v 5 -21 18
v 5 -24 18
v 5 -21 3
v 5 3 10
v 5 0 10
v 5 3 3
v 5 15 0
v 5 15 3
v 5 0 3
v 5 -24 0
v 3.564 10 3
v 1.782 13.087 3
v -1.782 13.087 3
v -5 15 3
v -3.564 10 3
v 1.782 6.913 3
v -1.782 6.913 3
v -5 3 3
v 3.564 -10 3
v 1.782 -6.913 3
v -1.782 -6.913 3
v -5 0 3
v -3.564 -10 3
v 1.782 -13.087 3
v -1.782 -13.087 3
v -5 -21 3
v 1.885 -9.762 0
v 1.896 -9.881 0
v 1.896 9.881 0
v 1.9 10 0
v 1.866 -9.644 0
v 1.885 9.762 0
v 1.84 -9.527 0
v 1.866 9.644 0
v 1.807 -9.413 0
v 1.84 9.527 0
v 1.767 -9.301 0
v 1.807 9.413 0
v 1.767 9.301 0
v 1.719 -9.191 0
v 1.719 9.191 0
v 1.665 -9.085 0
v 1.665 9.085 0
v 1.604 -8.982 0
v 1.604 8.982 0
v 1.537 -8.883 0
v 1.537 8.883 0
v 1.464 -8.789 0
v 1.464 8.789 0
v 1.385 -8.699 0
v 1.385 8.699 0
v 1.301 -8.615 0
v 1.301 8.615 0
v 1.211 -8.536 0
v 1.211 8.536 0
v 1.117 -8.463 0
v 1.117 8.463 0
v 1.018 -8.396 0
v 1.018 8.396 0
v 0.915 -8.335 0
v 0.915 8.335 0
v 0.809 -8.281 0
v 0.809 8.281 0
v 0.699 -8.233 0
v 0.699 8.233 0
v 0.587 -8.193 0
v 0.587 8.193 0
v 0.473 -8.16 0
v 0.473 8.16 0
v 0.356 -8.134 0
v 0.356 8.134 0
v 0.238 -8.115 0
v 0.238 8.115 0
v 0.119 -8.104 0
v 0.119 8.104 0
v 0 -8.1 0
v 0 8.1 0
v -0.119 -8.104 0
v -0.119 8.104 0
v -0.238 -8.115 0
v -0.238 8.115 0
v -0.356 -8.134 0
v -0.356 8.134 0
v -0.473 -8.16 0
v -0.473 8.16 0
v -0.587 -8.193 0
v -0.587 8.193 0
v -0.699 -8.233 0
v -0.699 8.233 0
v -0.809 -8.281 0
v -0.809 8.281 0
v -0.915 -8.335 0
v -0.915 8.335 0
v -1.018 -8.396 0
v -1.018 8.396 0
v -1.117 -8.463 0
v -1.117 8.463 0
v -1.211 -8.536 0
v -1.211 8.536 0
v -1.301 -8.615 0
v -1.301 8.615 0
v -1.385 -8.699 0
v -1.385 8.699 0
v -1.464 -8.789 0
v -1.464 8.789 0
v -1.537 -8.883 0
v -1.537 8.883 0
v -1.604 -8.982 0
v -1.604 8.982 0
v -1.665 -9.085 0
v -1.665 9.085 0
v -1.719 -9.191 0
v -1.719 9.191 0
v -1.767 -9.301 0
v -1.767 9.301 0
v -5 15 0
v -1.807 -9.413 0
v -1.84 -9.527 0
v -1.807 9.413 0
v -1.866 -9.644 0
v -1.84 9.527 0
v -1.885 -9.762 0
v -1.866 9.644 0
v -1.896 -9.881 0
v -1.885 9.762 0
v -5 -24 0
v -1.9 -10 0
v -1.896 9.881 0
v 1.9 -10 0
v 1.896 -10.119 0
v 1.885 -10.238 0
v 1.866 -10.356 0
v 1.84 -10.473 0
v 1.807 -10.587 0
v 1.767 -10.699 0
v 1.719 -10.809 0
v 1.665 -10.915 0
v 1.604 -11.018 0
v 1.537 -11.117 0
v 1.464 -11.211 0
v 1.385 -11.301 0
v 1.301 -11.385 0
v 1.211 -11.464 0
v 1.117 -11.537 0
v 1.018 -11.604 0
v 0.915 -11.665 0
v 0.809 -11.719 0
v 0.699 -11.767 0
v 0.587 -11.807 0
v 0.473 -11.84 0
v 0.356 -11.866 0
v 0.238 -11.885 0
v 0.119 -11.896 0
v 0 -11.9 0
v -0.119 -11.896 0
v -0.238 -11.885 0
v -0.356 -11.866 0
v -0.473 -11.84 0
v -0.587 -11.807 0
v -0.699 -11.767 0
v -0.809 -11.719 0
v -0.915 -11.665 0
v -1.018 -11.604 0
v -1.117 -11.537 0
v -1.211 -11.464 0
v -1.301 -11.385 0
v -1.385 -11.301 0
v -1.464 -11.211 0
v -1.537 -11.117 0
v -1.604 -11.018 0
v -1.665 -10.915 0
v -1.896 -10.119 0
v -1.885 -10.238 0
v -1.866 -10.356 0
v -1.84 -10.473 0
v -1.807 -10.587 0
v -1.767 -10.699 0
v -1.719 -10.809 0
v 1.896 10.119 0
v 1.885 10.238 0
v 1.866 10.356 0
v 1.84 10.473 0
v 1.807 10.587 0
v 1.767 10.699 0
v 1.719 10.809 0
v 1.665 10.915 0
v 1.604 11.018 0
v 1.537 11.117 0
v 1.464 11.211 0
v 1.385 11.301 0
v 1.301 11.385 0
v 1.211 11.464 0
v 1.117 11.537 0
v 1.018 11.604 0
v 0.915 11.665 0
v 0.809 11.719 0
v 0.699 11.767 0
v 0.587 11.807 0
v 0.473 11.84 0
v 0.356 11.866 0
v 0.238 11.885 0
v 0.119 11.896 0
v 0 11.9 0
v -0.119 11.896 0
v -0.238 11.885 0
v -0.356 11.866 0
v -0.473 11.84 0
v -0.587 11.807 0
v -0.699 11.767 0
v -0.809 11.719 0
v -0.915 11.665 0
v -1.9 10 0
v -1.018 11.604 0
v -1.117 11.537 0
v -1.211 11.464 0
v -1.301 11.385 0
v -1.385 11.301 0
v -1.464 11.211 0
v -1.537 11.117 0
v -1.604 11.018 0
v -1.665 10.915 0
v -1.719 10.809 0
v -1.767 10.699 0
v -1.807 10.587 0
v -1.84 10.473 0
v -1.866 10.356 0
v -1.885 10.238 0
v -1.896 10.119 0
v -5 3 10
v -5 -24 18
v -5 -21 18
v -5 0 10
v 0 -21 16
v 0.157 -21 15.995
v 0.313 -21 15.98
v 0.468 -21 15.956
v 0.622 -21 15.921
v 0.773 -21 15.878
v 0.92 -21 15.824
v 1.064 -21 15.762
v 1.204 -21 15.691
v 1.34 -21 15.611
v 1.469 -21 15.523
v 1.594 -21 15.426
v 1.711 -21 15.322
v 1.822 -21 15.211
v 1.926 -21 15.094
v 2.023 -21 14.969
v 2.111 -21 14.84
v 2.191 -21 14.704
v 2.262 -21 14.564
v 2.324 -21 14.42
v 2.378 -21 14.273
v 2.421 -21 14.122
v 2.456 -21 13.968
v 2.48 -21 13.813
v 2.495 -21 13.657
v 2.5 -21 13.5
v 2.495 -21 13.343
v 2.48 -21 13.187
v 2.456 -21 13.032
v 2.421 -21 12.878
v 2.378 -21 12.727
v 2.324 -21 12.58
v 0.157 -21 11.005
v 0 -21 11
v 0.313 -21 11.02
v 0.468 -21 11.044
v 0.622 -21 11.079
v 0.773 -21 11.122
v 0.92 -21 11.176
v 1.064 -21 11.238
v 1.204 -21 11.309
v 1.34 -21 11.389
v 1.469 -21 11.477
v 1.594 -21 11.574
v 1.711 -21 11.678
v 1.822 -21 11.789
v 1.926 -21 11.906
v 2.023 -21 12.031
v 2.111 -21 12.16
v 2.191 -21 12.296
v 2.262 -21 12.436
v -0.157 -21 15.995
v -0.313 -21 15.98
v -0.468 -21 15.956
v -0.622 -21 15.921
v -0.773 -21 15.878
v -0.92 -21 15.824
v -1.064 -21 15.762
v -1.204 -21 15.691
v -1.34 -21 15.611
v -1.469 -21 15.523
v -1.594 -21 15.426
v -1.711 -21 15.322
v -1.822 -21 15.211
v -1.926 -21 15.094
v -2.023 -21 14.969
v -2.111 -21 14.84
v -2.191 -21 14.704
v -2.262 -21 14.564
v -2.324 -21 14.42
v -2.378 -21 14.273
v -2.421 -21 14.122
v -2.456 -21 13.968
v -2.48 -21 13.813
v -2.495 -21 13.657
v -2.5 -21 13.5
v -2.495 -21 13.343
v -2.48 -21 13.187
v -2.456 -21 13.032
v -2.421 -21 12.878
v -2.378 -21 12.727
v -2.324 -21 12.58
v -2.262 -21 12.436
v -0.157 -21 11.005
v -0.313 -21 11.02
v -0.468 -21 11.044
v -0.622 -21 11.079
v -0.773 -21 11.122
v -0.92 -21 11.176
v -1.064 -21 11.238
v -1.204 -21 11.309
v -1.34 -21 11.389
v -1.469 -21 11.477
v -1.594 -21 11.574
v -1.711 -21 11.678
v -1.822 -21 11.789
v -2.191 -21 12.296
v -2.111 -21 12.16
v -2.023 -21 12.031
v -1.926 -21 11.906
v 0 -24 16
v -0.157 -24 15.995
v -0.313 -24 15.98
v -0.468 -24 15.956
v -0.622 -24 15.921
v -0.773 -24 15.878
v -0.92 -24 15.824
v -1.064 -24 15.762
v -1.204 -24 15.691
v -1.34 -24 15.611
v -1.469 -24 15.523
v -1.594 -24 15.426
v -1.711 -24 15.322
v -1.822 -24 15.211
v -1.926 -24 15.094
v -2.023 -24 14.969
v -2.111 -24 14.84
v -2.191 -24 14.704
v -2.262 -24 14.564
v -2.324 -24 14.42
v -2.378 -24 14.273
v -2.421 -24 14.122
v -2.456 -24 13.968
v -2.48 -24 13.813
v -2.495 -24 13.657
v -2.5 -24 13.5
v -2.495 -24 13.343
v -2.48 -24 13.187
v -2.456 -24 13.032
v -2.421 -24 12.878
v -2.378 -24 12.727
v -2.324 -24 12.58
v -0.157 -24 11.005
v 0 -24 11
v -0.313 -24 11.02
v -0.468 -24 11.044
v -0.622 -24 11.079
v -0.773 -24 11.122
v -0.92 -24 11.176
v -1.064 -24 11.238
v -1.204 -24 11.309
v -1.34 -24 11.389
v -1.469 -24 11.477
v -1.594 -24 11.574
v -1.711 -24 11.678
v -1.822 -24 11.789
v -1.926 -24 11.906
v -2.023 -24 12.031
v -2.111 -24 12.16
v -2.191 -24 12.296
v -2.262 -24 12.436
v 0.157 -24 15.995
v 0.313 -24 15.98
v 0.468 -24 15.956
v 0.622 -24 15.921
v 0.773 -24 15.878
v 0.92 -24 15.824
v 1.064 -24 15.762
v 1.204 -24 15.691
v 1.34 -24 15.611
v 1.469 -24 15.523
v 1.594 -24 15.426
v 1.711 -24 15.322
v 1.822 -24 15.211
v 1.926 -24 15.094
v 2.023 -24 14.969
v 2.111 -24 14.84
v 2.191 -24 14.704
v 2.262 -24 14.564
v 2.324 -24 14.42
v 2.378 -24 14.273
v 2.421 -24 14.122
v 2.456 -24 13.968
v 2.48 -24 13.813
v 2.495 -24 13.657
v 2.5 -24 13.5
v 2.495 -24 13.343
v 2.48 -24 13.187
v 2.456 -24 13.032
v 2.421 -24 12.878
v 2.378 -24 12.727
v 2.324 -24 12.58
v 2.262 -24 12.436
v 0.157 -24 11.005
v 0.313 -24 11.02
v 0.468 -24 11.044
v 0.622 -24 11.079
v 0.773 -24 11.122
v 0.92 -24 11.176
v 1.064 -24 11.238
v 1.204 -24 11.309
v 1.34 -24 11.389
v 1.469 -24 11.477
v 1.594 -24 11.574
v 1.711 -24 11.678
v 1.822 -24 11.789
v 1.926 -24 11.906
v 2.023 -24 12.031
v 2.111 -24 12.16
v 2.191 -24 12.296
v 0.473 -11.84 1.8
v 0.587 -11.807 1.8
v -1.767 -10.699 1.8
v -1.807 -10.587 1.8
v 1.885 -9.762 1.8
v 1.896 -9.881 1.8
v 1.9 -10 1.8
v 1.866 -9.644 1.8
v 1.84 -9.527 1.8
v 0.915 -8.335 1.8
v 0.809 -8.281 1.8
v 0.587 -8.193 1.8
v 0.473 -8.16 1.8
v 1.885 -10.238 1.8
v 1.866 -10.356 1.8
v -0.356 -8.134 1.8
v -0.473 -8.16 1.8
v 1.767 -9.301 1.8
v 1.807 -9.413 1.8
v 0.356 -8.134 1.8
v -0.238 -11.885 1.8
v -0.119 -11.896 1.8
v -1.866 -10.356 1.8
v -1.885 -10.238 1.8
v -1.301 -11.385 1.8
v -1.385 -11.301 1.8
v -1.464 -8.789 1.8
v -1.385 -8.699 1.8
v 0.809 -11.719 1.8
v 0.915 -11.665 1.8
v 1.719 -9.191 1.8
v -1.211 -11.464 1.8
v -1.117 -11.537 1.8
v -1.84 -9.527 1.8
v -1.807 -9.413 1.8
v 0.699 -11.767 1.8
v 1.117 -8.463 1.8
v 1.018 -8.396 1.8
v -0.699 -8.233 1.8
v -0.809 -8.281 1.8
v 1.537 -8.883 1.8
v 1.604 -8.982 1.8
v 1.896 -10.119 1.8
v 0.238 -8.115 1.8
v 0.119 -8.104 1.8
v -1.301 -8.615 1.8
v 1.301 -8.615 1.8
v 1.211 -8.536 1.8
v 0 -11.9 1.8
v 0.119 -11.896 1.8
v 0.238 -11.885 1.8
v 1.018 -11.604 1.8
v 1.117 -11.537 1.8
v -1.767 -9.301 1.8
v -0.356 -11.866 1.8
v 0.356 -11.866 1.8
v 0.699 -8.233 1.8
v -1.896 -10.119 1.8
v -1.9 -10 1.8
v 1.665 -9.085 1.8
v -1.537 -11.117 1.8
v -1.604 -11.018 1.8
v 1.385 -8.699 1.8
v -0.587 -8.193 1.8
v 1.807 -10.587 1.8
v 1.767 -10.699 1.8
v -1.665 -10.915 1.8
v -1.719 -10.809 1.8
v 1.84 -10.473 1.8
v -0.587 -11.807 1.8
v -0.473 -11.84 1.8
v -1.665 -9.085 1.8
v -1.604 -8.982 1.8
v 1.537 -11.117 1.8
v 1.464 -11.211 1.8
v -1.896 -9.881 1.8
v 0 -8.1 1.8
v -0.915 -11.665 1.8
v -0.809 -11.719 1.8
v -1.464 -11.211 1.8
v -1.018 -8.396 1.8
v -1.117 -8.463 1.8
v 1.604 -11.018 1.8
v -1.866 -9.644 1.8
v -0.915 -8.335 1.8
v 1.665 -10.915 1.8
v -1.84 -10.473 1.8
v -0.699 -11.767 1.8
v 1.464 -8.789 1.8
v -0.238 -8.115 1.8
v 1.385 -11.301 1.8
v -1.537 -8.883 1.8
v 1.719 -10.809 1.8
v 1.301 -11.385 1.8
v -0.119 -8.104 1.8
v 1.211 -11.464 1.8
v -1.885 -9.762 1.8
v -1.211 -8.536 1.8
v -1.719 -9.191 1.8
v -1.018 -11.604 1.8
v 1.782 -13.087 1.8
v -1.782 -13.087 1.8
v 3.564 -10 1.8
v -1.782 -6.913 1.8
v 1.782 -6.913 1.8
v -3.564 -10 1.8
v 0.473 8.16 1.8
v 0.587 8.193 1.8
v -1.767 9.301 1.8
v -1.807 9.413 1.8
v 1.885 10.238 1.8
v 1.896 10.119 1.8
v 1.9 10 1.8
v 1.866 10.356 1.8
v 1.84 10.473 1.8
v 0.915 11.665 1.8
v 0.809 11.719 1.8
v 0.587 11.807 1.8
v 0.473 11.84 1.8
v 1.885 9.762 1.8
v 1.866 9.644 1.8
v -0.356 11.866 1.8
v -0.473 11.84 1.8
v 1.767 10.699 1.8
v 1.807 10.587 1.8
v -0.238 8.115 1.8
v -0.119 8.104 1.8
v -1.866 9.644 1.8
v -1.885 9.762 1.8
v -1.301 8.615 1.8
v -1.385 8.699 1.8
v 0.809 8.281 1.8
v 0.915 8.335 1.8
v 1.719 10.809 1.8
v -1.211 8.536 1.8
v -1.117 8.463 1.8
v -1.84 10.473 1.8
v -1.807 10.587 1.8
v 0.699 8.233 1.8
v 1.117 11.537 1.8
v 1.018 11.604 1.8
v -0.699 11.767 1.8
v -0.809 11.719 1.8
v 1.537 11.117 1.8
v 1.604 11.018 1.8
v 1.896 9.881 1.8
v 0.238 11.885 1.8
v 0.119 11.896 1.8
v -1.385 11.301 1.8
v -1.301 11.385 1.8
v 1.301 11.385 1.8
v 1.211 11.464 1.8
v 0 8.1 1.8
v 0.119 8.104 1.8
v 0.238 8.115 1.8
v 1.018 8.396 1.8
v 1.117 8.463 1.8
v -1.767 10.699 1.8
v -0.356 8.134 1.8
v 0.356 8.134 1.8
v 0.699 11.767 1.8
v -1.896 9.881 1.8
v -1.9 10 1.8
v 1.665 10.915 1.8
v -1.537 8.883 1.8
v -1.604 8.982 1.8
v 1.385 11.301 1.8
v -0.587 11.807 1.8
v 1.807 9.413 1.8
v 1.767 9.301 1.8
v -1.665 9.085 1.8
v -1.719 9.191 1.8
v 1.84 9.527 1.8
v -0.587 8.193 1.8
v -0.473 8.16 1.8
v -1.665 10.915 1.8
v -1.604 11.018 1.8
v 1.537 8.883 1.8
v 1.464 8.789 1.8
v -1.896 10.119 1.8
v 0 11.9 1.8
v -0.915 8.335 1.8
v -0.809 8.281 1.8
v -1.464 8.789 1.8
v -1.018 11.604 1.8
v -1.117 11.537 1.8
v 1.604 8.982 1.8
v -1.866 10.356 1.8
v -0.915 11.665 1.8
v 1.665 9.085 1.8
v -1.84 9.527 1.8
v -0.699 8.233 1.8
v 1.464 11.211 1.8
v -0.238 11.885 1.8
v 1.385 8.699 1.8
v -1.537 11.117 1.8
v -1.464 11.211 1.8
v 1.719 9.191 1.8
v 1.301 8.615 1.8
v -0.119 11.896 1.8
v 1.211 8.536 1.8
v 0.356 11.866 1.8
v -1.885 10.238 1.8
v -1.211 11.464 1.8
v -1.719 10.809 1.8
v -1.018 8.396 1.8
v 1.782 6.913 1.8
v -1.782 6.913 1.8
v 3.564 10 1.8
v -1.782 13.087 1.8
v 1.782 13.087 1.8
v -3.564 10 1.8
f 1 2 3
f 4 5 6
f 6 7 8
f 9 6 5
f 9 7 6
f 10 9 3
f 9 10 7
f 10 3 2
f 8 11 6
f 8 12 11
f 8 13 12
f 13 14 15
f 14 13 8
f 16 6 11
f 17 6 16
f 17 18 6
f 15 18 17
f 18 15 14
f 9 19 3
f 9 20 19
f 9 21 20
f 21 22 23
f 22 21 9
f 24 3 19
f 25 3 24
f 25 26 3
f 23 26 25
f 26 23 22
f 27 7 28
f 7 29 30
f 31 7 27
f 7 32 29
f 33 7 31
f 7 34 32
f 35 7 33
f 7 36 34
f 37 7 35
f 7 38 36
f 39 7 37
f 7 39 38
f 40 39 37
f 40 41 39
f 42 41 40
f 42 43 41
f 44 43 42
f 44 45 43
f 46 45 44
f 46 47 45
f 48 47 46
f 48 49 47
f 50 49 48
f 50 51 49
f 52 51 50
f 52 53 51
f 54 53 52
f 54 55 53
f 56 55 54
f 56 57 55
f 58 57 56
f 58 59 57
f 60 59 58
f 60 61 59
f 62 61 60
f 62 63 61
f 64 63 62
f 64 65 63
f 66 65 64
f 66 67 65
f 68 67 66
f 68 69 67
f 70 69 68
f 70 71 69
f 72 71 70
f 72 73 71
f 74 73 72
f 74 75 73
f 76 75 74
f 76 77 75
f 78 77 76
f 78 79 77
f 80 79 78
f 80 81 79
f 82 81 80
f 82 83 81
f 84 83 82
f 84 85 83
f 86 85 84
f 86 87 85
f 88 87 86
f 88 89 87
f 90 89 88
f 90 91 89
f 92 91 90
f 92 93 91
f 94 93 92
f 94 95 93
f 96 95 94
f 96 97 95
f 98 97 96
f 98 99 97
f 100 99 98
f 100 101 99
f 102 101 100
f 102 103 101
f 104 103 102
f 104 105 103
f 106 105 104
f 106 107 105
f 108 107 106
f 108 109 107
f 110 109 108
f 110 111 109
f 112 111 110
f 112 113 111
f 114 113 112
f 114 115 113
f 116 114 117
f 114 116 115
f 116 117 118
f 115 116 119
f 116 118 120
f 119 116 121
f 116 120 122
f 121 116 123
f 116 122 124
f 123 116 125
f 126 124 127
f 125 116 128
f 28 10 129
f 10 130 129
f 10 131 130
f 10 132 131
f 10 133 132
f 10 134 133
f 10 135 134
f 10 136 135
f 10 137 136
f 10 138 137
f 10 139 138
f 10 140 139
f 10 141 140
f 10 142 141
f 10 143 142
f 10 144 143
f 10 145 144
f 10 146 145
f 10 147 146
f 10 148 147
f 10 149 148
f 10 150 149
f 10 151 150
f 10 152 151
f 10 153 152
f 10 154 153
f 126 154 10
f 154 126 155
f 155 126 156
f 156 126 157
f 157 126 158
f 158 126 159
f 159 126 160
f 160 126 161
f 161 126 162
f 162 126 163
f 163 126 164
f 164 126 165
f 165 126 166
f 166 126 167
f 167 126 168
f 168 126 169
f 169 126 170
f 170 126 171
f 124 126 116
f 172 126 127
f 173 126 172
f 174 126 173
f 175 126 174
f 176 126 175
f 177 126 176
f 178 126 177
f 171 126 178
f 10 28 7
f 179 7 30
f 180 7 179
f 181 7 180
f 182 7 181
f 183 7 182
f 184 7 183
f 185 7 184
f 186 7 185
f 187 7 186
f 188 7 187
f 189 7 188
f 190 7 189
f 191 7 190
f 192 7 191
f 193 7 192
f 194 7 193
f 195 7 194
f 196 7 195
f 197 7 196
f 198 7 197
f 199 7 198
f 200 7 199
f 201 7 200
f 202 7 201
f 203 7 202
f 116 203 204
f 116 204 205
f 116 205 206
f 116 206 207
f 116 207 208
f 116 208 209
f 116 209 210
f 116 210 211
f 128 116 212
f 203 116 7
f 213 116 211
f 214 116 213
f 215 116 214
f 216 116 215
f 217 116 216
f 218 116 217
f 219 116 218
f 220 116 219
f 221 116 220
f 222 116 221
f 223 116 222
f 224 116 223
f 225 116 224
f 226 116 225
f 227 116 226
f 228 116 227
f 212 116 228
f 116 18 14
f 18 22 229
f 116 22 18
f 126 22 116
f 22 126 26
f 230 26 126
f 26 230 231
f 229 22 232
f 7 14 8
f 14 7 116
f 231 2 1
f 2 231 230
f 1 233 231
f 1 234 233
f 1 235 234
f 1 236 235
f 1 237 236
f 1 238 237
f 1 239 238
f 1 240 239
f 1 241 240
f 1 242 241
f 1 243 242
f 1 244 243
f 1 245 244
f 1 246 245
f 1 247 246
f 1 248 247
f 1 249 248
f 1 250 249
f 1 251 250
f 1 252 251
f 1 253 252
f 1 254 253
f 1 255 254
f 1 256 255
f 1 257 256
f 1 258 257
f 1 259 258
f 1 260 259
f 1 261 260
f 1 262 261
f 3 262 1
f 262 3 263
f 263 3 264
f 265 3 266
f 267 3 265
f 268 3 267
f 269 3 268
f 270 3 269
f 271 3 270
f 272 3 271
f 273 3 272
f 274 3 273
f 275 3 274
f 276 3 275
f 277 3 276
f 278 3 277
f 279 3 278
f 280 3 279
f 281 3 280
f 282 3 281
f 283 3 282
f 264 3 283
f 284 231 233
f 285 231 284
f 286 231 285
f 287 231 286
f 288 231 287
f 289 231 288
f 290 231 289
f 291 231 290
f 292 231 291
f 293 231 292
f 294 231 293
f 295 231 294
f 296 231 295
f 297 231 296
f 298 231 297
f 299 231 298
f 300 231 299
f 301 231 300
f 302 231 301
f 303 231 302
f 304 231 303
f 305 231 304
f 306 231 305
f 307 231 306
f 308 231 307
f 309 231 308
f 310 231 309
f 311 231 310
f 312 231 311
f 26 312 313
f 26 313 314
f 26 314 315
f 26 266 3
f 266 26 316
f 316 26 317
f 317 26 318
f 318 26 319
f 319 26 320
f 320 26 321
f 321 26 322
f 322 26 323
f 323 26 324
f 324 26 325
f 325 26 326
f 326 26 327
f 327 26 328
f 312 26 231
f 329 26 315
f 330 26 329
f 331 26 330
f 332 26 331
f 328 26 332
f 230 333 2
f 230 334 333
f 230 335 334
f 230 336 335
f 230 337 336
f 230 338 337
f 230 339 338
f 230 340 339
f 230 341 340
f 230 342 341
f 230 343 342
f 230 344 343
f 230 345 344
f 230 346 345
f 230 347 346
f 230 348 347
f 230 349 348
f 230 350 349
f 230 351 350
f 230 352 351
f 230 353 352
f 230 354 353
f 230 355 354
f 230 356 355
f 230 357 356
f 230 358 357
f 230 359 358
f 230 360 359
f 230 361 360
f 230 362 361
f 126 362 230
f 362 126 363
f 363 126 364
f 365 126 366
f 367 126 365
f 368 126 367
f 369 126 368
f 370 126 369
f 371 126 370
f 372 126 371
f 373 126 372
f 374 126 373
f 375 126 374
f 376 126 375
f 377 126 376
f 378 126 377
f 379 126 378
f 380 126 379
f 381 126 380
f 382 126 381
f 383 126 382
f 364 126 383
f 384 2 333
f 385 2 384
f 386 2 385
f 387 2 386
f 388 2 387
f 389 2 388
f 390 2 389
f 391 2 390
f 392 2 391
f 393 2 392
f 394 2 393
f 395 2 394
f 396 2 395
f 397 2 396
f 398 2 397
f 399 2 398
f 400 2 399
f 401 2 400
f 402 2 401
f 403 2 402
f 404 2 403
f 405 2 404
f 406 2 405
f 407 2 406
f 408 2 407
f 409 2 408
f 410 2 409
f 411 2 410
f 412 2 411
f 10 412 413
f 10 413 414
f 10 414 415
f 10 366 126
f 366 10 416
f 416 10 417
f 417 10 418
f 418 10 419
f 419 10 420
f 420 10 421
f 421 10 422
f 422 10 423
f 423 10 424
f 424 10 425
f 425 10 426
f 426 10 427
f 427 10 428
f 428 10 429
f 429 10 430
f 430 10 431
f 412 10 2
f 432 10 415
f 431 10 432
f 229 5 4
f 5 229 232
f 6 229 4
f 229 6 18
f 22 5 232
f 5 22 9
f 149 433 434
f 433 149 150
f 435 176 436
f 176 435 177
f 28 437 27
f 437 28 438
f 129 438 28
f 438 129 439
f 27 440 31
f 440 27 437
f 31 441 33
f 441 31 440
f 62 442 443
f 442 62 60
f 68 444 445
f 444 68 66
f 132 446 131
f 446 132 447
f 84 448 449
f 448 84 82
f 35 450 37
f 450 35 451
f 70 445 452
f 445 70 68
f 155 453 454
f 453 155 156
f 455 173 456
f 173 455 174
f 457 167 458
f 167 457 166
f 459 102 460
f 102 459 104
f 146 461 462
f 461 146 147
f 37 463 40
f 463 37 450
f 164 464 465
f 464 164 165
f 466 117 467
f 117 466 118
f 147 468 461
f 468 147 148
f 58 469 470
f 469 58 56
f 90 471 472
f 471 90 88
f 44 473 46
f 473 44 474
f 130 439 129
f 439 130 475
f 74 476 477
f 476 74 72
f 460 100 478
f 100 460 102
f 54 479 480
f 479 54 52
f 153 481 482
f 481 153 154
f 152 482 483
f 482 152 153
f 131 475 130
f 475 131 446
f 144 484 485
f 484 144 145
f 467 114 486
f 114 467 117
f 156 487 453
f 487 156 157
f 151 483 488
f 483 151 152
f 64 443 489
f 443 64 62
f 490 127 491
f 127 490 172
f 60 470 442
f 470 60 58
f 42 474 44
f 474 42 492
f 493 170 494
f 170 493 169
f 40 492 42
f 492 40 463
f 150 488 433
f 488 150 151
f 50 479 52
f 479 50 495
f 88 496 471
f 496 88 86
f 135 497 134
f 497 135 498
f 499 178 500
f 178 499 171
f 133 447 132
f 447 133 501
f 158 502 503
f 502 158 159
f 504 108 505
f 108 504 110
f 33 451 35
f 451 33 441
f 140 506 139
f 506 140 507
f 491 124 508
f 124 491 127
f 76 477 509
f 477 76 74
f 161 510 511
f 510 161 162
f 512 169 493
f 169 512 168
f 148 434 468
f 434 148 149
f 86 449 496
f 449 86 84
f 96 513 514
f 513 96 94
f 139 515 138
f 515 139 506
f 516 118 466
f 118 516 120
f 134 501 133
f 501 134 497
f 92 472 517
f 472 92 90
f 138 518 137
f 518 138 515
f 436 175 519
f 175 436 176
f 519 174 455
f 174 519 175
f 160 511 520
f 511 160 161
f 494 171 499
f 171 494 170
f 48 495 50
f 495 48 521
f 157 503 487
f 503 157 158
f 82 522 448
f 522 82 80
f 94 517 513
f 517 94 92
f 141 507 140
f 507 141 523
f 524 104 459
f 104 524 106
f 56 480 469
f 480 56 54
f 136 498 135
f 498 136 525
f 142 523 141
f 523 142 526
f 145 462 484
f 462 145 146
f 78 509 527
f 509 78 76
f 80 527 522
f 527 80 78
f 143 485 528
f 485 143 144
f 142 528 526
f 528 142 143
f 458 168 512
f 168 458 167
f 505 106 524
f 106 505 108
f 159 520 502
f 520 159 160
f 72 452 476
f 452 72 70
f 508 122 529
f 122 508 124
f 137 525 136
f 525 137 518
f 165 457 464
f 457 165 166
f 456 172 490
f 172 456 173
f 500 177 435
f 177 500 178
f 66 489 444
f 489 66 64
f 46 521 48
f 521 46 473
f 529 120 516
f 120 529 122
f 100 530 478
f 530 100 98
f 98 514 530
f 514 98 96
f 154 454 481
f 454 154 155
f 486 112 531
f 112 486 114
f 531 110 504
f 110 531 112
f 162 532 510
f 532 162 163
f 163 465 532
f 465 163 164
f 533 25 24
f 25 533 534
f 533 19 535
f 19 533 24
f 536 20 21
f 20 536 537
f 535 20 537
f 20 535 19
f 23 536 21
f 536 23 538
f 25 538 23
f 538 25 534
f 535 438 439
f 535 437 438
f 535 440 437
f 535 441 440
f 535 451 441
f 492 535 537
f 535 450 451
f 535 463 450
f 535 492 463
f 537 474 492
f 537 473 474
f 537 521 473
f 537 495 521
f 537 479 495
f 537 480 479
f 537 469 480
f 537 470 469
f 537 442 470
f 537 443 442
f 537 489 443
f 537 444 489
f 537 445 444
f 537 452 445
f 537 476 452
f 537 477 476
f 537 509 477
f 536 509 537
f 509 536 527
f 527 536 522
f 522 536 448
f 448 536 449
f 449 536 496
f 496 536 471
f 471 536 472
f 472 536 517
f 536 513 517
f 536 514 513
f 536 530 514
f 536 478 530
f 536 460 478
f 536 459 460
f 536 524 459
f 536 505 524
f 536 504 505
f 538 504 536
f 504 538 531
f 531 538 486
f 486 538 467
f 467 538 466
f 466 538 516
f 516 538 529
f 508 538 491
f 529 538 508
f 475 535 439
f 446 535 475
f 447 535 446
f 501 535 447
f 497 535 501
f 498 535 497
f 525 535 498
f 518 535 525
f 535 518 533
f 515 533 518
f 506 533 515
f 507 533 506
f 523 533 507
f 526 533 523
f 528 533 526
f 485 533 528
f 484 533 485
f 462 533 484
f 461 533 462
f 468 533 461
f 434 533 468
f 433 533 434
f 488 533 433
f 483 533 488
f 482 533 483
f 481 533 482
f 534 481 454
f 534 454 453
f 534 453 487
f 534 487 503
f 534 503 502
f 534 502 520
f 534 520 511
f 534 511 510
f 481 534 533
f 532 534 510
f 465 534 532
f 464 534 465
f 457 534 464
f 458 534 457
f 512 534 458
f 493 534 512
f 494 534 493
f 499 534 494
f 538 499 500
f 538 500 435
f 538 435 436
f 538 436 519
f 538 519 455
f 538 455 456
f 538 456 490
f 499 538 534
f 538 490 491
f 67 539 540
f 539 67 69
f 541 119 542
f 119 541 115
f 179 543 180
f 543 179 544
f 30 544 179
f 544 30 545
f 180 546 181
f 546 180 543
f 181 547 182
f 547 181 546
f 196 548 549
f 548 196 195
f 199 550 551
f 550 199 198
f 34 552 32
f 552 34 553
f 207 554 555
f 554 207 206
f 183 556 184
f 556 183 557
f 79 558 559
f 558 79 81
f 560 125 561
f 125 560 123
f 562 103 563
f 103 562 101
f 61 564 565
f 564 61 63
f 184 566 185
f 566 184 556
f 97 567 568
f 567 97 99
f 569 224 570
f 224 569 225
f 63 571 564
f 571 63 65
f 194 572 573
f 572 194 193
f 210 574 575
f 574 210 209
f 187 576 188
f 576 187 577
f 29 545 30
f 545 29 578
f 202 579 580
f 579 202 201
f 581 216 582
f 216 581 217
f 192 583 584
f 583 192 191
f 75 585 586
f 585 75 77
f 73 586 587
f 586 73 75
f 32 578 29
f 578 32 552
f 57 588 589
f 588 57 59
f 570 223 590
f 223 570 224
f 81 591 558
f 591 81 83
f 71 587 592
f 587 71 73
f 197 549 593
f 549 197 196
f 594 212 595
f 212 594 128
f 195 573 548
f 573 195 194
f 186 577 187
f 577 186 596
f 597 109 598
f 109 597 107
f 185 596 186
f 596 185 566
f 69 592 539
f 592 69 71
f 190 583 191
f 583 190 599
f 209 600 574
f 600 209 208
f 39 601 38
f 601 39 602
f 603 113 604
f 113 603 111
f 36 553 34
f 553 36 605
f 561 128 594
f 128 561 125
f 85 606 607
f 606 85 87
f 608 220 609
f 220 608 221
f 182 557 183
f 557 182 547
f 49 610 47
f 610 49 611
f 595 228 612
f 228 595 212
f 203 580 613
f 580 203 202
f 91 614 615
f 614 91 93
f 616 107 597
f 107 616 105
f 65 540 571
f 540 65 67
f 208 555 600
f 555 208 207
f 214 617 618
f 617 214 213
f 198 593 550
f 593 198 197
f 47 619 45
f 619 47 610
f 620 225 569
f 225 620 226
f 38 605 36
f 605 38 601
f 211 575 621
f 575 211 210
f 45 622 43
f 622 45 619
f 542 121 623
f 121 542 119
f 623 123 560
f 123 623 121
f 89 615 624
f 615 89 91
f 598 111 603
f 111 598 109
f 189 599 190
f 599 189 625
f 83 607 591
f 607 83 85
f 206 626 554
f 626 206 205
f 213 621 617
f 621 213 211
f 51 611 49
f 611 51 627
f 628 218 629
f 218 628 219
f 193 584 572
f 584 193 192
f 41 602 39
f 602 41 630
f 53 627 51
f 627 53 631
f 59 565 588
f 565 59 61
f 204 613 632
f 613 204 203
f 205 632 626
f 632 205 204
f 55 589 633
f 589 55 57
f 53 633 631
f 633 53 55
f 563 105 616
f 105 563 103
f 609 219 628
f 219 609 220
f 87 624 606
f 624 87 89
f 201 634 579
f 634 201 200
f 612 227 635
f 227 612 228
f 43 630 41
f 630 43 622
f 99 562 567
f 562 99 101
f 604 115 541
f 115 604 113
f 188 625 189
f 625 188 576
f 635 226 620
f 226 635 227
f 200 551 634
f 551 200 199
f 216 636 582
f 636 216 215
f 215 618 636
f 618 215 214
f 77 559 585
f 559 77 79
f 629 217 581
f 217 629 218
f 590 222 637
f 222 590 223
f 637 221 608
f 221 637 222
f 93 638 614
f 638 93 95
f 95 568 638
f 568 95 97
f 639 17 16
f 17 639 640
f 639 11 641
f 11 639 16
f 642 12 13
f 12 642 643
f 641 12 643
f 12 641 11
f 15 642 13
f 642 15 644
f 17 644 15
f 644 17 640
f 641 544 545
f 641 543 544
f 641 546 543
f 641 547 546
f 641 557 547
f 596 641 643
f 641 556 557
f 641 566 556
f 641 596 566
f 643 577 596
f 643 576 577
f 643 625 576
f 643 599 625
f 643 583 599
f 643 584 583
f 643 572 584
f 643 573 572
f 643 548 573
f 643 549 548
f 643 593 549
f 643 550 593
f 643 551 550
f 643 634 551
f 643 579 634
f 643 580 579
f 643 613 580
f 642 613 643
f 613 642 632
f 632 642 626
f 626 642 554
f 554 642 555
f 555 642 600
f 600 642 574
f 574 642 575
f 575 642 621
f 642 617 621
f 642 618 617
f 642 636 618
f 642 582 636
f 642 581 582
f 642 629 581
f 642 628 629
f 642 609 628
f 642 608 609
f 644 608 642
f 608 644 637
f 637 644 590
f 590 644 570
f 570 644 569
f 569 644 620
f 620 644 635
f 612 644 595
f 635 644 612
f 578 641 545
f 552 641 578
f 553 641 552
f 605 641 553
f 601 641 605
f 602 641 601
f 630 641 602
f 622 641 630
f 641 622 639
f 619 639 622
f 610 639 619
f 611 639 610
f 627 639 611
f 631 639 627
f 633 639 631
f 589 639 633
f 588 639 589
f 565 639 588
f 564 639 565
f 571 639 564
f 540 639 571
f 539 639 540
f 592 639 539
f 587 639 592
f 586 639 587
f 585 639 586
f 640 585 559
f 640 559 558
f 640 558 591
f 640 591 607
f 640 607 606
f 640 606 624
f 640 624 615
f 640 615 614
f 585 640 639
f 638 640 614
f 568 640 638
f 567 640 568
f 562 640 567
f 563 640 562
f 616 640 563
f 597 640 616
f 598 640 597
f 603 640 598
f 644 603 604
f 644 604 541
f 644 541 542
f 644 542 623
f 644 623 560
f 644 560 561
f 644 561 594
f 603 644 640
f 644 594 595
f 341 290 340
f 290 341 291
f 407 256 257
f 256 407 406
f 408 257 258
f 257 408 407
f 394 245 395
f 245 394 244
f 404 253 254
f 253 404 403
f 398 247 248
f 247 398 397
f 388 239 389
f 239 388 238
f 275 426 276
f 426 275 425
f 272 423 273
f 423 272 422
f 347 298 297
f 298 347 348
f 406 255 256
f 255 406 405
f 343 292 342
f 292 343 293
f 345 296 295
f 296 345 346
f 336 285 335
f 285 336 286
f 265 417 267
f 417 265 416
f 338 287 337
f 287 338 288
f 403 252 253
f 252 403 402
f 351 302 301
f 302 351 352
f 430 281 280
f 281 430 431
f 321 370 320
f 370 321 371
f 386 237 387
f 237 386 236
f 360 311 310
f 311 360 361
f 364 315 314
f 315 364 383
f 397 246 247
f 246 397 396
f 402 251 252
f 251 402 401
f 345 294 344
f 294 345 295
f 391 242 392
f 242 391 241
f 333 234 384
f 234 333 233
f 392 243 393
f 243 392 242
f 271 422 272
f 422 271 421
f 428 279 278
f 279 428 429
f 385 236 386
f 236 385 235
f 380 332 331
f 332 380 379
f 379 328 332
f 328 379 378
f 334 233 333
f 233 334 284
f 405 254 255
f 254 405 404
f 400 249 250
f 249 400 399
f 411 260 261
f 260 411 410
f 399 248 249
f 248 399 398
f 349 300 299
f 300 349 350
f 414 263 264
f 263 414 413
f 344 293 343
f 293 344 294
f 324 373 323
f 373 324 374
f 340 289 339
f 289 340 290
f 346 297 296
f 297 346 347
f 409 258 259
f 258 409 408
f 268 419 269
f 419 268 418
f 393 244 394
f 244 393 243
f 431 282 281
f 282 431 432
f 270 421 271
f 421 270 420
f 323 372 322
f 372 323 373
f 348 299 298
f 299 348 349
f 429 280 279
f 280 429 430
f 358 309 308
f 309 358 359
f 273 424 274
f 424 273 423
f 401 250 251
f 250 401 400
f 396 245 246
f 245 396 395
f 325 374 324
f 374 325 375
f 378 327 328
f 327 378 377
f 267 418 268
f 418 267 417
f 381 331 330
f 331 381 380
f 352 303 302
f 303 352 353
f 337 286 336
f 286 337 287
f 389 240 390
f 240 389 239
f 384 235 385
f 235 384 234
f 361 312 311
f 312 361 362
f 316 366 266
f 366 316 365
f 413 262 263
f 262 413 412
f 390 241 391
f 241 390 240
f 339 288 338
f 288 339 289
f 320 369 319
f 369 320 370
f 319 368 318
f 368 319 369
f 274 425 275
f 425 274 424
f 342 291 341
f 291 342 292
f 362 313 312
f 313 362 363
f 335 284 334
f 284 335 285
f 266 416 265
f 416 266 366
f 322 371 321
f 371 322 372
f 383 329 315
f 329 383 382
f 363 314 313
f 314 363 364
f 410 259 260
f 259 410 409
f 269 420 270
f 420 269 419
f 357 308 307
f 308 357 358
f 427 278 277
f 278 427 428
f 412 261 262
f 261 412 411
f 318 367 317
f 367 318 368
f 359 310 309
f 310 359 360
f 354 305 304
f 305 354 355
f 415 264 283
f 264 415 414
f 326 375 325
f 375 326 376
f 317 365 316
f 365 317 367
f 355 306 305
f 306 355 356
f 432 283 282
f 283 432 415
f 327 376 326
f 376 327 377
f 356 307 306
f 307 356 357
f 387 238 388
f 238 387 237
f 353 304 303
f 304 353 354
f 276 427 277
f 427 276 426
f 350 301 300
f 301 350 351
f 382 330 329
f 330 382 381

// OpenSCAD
lengths = [8, 12];
widths = [3.5, 9];
heights = [6, 3];

nut_trap_depth = 1.2;
thickness = 3;

difference() {
    union() {
        translate([0, -4, 1.5]) cube(size=[10, 38, thickness], center=true);
        translate([0, -(21 + thickness/2), 18/2]) cube(size=[10, thickness, 18], center=true);
        translate([0, thickness/2, 10/2]) cube(size=[10, thickness, 10], center=true);
    }
//translate([-8, -10]) {
//    cylinder(d = 5, h = 20, $fn = 100, center = true);  
//}
translate([0, 0, thickness + 10.5]) rotate([90, 0, 0]) cylinder(h=100, d=5, $fn=100, center=true);
for (offsets = [[0, -10], [0, 10]]) {
    translate([offsets[0], offsets[1]]) {
        cylinder(d = 3.8, h = 20, $fn = 100, center = true);  
        translate([0, 0, 3 - nut_trap_depth]) cylinder(d = 6 / cos(180 / 6) + 0.2, h = nut_trap_depth + 1, $fn = 6);
    }
}
}
